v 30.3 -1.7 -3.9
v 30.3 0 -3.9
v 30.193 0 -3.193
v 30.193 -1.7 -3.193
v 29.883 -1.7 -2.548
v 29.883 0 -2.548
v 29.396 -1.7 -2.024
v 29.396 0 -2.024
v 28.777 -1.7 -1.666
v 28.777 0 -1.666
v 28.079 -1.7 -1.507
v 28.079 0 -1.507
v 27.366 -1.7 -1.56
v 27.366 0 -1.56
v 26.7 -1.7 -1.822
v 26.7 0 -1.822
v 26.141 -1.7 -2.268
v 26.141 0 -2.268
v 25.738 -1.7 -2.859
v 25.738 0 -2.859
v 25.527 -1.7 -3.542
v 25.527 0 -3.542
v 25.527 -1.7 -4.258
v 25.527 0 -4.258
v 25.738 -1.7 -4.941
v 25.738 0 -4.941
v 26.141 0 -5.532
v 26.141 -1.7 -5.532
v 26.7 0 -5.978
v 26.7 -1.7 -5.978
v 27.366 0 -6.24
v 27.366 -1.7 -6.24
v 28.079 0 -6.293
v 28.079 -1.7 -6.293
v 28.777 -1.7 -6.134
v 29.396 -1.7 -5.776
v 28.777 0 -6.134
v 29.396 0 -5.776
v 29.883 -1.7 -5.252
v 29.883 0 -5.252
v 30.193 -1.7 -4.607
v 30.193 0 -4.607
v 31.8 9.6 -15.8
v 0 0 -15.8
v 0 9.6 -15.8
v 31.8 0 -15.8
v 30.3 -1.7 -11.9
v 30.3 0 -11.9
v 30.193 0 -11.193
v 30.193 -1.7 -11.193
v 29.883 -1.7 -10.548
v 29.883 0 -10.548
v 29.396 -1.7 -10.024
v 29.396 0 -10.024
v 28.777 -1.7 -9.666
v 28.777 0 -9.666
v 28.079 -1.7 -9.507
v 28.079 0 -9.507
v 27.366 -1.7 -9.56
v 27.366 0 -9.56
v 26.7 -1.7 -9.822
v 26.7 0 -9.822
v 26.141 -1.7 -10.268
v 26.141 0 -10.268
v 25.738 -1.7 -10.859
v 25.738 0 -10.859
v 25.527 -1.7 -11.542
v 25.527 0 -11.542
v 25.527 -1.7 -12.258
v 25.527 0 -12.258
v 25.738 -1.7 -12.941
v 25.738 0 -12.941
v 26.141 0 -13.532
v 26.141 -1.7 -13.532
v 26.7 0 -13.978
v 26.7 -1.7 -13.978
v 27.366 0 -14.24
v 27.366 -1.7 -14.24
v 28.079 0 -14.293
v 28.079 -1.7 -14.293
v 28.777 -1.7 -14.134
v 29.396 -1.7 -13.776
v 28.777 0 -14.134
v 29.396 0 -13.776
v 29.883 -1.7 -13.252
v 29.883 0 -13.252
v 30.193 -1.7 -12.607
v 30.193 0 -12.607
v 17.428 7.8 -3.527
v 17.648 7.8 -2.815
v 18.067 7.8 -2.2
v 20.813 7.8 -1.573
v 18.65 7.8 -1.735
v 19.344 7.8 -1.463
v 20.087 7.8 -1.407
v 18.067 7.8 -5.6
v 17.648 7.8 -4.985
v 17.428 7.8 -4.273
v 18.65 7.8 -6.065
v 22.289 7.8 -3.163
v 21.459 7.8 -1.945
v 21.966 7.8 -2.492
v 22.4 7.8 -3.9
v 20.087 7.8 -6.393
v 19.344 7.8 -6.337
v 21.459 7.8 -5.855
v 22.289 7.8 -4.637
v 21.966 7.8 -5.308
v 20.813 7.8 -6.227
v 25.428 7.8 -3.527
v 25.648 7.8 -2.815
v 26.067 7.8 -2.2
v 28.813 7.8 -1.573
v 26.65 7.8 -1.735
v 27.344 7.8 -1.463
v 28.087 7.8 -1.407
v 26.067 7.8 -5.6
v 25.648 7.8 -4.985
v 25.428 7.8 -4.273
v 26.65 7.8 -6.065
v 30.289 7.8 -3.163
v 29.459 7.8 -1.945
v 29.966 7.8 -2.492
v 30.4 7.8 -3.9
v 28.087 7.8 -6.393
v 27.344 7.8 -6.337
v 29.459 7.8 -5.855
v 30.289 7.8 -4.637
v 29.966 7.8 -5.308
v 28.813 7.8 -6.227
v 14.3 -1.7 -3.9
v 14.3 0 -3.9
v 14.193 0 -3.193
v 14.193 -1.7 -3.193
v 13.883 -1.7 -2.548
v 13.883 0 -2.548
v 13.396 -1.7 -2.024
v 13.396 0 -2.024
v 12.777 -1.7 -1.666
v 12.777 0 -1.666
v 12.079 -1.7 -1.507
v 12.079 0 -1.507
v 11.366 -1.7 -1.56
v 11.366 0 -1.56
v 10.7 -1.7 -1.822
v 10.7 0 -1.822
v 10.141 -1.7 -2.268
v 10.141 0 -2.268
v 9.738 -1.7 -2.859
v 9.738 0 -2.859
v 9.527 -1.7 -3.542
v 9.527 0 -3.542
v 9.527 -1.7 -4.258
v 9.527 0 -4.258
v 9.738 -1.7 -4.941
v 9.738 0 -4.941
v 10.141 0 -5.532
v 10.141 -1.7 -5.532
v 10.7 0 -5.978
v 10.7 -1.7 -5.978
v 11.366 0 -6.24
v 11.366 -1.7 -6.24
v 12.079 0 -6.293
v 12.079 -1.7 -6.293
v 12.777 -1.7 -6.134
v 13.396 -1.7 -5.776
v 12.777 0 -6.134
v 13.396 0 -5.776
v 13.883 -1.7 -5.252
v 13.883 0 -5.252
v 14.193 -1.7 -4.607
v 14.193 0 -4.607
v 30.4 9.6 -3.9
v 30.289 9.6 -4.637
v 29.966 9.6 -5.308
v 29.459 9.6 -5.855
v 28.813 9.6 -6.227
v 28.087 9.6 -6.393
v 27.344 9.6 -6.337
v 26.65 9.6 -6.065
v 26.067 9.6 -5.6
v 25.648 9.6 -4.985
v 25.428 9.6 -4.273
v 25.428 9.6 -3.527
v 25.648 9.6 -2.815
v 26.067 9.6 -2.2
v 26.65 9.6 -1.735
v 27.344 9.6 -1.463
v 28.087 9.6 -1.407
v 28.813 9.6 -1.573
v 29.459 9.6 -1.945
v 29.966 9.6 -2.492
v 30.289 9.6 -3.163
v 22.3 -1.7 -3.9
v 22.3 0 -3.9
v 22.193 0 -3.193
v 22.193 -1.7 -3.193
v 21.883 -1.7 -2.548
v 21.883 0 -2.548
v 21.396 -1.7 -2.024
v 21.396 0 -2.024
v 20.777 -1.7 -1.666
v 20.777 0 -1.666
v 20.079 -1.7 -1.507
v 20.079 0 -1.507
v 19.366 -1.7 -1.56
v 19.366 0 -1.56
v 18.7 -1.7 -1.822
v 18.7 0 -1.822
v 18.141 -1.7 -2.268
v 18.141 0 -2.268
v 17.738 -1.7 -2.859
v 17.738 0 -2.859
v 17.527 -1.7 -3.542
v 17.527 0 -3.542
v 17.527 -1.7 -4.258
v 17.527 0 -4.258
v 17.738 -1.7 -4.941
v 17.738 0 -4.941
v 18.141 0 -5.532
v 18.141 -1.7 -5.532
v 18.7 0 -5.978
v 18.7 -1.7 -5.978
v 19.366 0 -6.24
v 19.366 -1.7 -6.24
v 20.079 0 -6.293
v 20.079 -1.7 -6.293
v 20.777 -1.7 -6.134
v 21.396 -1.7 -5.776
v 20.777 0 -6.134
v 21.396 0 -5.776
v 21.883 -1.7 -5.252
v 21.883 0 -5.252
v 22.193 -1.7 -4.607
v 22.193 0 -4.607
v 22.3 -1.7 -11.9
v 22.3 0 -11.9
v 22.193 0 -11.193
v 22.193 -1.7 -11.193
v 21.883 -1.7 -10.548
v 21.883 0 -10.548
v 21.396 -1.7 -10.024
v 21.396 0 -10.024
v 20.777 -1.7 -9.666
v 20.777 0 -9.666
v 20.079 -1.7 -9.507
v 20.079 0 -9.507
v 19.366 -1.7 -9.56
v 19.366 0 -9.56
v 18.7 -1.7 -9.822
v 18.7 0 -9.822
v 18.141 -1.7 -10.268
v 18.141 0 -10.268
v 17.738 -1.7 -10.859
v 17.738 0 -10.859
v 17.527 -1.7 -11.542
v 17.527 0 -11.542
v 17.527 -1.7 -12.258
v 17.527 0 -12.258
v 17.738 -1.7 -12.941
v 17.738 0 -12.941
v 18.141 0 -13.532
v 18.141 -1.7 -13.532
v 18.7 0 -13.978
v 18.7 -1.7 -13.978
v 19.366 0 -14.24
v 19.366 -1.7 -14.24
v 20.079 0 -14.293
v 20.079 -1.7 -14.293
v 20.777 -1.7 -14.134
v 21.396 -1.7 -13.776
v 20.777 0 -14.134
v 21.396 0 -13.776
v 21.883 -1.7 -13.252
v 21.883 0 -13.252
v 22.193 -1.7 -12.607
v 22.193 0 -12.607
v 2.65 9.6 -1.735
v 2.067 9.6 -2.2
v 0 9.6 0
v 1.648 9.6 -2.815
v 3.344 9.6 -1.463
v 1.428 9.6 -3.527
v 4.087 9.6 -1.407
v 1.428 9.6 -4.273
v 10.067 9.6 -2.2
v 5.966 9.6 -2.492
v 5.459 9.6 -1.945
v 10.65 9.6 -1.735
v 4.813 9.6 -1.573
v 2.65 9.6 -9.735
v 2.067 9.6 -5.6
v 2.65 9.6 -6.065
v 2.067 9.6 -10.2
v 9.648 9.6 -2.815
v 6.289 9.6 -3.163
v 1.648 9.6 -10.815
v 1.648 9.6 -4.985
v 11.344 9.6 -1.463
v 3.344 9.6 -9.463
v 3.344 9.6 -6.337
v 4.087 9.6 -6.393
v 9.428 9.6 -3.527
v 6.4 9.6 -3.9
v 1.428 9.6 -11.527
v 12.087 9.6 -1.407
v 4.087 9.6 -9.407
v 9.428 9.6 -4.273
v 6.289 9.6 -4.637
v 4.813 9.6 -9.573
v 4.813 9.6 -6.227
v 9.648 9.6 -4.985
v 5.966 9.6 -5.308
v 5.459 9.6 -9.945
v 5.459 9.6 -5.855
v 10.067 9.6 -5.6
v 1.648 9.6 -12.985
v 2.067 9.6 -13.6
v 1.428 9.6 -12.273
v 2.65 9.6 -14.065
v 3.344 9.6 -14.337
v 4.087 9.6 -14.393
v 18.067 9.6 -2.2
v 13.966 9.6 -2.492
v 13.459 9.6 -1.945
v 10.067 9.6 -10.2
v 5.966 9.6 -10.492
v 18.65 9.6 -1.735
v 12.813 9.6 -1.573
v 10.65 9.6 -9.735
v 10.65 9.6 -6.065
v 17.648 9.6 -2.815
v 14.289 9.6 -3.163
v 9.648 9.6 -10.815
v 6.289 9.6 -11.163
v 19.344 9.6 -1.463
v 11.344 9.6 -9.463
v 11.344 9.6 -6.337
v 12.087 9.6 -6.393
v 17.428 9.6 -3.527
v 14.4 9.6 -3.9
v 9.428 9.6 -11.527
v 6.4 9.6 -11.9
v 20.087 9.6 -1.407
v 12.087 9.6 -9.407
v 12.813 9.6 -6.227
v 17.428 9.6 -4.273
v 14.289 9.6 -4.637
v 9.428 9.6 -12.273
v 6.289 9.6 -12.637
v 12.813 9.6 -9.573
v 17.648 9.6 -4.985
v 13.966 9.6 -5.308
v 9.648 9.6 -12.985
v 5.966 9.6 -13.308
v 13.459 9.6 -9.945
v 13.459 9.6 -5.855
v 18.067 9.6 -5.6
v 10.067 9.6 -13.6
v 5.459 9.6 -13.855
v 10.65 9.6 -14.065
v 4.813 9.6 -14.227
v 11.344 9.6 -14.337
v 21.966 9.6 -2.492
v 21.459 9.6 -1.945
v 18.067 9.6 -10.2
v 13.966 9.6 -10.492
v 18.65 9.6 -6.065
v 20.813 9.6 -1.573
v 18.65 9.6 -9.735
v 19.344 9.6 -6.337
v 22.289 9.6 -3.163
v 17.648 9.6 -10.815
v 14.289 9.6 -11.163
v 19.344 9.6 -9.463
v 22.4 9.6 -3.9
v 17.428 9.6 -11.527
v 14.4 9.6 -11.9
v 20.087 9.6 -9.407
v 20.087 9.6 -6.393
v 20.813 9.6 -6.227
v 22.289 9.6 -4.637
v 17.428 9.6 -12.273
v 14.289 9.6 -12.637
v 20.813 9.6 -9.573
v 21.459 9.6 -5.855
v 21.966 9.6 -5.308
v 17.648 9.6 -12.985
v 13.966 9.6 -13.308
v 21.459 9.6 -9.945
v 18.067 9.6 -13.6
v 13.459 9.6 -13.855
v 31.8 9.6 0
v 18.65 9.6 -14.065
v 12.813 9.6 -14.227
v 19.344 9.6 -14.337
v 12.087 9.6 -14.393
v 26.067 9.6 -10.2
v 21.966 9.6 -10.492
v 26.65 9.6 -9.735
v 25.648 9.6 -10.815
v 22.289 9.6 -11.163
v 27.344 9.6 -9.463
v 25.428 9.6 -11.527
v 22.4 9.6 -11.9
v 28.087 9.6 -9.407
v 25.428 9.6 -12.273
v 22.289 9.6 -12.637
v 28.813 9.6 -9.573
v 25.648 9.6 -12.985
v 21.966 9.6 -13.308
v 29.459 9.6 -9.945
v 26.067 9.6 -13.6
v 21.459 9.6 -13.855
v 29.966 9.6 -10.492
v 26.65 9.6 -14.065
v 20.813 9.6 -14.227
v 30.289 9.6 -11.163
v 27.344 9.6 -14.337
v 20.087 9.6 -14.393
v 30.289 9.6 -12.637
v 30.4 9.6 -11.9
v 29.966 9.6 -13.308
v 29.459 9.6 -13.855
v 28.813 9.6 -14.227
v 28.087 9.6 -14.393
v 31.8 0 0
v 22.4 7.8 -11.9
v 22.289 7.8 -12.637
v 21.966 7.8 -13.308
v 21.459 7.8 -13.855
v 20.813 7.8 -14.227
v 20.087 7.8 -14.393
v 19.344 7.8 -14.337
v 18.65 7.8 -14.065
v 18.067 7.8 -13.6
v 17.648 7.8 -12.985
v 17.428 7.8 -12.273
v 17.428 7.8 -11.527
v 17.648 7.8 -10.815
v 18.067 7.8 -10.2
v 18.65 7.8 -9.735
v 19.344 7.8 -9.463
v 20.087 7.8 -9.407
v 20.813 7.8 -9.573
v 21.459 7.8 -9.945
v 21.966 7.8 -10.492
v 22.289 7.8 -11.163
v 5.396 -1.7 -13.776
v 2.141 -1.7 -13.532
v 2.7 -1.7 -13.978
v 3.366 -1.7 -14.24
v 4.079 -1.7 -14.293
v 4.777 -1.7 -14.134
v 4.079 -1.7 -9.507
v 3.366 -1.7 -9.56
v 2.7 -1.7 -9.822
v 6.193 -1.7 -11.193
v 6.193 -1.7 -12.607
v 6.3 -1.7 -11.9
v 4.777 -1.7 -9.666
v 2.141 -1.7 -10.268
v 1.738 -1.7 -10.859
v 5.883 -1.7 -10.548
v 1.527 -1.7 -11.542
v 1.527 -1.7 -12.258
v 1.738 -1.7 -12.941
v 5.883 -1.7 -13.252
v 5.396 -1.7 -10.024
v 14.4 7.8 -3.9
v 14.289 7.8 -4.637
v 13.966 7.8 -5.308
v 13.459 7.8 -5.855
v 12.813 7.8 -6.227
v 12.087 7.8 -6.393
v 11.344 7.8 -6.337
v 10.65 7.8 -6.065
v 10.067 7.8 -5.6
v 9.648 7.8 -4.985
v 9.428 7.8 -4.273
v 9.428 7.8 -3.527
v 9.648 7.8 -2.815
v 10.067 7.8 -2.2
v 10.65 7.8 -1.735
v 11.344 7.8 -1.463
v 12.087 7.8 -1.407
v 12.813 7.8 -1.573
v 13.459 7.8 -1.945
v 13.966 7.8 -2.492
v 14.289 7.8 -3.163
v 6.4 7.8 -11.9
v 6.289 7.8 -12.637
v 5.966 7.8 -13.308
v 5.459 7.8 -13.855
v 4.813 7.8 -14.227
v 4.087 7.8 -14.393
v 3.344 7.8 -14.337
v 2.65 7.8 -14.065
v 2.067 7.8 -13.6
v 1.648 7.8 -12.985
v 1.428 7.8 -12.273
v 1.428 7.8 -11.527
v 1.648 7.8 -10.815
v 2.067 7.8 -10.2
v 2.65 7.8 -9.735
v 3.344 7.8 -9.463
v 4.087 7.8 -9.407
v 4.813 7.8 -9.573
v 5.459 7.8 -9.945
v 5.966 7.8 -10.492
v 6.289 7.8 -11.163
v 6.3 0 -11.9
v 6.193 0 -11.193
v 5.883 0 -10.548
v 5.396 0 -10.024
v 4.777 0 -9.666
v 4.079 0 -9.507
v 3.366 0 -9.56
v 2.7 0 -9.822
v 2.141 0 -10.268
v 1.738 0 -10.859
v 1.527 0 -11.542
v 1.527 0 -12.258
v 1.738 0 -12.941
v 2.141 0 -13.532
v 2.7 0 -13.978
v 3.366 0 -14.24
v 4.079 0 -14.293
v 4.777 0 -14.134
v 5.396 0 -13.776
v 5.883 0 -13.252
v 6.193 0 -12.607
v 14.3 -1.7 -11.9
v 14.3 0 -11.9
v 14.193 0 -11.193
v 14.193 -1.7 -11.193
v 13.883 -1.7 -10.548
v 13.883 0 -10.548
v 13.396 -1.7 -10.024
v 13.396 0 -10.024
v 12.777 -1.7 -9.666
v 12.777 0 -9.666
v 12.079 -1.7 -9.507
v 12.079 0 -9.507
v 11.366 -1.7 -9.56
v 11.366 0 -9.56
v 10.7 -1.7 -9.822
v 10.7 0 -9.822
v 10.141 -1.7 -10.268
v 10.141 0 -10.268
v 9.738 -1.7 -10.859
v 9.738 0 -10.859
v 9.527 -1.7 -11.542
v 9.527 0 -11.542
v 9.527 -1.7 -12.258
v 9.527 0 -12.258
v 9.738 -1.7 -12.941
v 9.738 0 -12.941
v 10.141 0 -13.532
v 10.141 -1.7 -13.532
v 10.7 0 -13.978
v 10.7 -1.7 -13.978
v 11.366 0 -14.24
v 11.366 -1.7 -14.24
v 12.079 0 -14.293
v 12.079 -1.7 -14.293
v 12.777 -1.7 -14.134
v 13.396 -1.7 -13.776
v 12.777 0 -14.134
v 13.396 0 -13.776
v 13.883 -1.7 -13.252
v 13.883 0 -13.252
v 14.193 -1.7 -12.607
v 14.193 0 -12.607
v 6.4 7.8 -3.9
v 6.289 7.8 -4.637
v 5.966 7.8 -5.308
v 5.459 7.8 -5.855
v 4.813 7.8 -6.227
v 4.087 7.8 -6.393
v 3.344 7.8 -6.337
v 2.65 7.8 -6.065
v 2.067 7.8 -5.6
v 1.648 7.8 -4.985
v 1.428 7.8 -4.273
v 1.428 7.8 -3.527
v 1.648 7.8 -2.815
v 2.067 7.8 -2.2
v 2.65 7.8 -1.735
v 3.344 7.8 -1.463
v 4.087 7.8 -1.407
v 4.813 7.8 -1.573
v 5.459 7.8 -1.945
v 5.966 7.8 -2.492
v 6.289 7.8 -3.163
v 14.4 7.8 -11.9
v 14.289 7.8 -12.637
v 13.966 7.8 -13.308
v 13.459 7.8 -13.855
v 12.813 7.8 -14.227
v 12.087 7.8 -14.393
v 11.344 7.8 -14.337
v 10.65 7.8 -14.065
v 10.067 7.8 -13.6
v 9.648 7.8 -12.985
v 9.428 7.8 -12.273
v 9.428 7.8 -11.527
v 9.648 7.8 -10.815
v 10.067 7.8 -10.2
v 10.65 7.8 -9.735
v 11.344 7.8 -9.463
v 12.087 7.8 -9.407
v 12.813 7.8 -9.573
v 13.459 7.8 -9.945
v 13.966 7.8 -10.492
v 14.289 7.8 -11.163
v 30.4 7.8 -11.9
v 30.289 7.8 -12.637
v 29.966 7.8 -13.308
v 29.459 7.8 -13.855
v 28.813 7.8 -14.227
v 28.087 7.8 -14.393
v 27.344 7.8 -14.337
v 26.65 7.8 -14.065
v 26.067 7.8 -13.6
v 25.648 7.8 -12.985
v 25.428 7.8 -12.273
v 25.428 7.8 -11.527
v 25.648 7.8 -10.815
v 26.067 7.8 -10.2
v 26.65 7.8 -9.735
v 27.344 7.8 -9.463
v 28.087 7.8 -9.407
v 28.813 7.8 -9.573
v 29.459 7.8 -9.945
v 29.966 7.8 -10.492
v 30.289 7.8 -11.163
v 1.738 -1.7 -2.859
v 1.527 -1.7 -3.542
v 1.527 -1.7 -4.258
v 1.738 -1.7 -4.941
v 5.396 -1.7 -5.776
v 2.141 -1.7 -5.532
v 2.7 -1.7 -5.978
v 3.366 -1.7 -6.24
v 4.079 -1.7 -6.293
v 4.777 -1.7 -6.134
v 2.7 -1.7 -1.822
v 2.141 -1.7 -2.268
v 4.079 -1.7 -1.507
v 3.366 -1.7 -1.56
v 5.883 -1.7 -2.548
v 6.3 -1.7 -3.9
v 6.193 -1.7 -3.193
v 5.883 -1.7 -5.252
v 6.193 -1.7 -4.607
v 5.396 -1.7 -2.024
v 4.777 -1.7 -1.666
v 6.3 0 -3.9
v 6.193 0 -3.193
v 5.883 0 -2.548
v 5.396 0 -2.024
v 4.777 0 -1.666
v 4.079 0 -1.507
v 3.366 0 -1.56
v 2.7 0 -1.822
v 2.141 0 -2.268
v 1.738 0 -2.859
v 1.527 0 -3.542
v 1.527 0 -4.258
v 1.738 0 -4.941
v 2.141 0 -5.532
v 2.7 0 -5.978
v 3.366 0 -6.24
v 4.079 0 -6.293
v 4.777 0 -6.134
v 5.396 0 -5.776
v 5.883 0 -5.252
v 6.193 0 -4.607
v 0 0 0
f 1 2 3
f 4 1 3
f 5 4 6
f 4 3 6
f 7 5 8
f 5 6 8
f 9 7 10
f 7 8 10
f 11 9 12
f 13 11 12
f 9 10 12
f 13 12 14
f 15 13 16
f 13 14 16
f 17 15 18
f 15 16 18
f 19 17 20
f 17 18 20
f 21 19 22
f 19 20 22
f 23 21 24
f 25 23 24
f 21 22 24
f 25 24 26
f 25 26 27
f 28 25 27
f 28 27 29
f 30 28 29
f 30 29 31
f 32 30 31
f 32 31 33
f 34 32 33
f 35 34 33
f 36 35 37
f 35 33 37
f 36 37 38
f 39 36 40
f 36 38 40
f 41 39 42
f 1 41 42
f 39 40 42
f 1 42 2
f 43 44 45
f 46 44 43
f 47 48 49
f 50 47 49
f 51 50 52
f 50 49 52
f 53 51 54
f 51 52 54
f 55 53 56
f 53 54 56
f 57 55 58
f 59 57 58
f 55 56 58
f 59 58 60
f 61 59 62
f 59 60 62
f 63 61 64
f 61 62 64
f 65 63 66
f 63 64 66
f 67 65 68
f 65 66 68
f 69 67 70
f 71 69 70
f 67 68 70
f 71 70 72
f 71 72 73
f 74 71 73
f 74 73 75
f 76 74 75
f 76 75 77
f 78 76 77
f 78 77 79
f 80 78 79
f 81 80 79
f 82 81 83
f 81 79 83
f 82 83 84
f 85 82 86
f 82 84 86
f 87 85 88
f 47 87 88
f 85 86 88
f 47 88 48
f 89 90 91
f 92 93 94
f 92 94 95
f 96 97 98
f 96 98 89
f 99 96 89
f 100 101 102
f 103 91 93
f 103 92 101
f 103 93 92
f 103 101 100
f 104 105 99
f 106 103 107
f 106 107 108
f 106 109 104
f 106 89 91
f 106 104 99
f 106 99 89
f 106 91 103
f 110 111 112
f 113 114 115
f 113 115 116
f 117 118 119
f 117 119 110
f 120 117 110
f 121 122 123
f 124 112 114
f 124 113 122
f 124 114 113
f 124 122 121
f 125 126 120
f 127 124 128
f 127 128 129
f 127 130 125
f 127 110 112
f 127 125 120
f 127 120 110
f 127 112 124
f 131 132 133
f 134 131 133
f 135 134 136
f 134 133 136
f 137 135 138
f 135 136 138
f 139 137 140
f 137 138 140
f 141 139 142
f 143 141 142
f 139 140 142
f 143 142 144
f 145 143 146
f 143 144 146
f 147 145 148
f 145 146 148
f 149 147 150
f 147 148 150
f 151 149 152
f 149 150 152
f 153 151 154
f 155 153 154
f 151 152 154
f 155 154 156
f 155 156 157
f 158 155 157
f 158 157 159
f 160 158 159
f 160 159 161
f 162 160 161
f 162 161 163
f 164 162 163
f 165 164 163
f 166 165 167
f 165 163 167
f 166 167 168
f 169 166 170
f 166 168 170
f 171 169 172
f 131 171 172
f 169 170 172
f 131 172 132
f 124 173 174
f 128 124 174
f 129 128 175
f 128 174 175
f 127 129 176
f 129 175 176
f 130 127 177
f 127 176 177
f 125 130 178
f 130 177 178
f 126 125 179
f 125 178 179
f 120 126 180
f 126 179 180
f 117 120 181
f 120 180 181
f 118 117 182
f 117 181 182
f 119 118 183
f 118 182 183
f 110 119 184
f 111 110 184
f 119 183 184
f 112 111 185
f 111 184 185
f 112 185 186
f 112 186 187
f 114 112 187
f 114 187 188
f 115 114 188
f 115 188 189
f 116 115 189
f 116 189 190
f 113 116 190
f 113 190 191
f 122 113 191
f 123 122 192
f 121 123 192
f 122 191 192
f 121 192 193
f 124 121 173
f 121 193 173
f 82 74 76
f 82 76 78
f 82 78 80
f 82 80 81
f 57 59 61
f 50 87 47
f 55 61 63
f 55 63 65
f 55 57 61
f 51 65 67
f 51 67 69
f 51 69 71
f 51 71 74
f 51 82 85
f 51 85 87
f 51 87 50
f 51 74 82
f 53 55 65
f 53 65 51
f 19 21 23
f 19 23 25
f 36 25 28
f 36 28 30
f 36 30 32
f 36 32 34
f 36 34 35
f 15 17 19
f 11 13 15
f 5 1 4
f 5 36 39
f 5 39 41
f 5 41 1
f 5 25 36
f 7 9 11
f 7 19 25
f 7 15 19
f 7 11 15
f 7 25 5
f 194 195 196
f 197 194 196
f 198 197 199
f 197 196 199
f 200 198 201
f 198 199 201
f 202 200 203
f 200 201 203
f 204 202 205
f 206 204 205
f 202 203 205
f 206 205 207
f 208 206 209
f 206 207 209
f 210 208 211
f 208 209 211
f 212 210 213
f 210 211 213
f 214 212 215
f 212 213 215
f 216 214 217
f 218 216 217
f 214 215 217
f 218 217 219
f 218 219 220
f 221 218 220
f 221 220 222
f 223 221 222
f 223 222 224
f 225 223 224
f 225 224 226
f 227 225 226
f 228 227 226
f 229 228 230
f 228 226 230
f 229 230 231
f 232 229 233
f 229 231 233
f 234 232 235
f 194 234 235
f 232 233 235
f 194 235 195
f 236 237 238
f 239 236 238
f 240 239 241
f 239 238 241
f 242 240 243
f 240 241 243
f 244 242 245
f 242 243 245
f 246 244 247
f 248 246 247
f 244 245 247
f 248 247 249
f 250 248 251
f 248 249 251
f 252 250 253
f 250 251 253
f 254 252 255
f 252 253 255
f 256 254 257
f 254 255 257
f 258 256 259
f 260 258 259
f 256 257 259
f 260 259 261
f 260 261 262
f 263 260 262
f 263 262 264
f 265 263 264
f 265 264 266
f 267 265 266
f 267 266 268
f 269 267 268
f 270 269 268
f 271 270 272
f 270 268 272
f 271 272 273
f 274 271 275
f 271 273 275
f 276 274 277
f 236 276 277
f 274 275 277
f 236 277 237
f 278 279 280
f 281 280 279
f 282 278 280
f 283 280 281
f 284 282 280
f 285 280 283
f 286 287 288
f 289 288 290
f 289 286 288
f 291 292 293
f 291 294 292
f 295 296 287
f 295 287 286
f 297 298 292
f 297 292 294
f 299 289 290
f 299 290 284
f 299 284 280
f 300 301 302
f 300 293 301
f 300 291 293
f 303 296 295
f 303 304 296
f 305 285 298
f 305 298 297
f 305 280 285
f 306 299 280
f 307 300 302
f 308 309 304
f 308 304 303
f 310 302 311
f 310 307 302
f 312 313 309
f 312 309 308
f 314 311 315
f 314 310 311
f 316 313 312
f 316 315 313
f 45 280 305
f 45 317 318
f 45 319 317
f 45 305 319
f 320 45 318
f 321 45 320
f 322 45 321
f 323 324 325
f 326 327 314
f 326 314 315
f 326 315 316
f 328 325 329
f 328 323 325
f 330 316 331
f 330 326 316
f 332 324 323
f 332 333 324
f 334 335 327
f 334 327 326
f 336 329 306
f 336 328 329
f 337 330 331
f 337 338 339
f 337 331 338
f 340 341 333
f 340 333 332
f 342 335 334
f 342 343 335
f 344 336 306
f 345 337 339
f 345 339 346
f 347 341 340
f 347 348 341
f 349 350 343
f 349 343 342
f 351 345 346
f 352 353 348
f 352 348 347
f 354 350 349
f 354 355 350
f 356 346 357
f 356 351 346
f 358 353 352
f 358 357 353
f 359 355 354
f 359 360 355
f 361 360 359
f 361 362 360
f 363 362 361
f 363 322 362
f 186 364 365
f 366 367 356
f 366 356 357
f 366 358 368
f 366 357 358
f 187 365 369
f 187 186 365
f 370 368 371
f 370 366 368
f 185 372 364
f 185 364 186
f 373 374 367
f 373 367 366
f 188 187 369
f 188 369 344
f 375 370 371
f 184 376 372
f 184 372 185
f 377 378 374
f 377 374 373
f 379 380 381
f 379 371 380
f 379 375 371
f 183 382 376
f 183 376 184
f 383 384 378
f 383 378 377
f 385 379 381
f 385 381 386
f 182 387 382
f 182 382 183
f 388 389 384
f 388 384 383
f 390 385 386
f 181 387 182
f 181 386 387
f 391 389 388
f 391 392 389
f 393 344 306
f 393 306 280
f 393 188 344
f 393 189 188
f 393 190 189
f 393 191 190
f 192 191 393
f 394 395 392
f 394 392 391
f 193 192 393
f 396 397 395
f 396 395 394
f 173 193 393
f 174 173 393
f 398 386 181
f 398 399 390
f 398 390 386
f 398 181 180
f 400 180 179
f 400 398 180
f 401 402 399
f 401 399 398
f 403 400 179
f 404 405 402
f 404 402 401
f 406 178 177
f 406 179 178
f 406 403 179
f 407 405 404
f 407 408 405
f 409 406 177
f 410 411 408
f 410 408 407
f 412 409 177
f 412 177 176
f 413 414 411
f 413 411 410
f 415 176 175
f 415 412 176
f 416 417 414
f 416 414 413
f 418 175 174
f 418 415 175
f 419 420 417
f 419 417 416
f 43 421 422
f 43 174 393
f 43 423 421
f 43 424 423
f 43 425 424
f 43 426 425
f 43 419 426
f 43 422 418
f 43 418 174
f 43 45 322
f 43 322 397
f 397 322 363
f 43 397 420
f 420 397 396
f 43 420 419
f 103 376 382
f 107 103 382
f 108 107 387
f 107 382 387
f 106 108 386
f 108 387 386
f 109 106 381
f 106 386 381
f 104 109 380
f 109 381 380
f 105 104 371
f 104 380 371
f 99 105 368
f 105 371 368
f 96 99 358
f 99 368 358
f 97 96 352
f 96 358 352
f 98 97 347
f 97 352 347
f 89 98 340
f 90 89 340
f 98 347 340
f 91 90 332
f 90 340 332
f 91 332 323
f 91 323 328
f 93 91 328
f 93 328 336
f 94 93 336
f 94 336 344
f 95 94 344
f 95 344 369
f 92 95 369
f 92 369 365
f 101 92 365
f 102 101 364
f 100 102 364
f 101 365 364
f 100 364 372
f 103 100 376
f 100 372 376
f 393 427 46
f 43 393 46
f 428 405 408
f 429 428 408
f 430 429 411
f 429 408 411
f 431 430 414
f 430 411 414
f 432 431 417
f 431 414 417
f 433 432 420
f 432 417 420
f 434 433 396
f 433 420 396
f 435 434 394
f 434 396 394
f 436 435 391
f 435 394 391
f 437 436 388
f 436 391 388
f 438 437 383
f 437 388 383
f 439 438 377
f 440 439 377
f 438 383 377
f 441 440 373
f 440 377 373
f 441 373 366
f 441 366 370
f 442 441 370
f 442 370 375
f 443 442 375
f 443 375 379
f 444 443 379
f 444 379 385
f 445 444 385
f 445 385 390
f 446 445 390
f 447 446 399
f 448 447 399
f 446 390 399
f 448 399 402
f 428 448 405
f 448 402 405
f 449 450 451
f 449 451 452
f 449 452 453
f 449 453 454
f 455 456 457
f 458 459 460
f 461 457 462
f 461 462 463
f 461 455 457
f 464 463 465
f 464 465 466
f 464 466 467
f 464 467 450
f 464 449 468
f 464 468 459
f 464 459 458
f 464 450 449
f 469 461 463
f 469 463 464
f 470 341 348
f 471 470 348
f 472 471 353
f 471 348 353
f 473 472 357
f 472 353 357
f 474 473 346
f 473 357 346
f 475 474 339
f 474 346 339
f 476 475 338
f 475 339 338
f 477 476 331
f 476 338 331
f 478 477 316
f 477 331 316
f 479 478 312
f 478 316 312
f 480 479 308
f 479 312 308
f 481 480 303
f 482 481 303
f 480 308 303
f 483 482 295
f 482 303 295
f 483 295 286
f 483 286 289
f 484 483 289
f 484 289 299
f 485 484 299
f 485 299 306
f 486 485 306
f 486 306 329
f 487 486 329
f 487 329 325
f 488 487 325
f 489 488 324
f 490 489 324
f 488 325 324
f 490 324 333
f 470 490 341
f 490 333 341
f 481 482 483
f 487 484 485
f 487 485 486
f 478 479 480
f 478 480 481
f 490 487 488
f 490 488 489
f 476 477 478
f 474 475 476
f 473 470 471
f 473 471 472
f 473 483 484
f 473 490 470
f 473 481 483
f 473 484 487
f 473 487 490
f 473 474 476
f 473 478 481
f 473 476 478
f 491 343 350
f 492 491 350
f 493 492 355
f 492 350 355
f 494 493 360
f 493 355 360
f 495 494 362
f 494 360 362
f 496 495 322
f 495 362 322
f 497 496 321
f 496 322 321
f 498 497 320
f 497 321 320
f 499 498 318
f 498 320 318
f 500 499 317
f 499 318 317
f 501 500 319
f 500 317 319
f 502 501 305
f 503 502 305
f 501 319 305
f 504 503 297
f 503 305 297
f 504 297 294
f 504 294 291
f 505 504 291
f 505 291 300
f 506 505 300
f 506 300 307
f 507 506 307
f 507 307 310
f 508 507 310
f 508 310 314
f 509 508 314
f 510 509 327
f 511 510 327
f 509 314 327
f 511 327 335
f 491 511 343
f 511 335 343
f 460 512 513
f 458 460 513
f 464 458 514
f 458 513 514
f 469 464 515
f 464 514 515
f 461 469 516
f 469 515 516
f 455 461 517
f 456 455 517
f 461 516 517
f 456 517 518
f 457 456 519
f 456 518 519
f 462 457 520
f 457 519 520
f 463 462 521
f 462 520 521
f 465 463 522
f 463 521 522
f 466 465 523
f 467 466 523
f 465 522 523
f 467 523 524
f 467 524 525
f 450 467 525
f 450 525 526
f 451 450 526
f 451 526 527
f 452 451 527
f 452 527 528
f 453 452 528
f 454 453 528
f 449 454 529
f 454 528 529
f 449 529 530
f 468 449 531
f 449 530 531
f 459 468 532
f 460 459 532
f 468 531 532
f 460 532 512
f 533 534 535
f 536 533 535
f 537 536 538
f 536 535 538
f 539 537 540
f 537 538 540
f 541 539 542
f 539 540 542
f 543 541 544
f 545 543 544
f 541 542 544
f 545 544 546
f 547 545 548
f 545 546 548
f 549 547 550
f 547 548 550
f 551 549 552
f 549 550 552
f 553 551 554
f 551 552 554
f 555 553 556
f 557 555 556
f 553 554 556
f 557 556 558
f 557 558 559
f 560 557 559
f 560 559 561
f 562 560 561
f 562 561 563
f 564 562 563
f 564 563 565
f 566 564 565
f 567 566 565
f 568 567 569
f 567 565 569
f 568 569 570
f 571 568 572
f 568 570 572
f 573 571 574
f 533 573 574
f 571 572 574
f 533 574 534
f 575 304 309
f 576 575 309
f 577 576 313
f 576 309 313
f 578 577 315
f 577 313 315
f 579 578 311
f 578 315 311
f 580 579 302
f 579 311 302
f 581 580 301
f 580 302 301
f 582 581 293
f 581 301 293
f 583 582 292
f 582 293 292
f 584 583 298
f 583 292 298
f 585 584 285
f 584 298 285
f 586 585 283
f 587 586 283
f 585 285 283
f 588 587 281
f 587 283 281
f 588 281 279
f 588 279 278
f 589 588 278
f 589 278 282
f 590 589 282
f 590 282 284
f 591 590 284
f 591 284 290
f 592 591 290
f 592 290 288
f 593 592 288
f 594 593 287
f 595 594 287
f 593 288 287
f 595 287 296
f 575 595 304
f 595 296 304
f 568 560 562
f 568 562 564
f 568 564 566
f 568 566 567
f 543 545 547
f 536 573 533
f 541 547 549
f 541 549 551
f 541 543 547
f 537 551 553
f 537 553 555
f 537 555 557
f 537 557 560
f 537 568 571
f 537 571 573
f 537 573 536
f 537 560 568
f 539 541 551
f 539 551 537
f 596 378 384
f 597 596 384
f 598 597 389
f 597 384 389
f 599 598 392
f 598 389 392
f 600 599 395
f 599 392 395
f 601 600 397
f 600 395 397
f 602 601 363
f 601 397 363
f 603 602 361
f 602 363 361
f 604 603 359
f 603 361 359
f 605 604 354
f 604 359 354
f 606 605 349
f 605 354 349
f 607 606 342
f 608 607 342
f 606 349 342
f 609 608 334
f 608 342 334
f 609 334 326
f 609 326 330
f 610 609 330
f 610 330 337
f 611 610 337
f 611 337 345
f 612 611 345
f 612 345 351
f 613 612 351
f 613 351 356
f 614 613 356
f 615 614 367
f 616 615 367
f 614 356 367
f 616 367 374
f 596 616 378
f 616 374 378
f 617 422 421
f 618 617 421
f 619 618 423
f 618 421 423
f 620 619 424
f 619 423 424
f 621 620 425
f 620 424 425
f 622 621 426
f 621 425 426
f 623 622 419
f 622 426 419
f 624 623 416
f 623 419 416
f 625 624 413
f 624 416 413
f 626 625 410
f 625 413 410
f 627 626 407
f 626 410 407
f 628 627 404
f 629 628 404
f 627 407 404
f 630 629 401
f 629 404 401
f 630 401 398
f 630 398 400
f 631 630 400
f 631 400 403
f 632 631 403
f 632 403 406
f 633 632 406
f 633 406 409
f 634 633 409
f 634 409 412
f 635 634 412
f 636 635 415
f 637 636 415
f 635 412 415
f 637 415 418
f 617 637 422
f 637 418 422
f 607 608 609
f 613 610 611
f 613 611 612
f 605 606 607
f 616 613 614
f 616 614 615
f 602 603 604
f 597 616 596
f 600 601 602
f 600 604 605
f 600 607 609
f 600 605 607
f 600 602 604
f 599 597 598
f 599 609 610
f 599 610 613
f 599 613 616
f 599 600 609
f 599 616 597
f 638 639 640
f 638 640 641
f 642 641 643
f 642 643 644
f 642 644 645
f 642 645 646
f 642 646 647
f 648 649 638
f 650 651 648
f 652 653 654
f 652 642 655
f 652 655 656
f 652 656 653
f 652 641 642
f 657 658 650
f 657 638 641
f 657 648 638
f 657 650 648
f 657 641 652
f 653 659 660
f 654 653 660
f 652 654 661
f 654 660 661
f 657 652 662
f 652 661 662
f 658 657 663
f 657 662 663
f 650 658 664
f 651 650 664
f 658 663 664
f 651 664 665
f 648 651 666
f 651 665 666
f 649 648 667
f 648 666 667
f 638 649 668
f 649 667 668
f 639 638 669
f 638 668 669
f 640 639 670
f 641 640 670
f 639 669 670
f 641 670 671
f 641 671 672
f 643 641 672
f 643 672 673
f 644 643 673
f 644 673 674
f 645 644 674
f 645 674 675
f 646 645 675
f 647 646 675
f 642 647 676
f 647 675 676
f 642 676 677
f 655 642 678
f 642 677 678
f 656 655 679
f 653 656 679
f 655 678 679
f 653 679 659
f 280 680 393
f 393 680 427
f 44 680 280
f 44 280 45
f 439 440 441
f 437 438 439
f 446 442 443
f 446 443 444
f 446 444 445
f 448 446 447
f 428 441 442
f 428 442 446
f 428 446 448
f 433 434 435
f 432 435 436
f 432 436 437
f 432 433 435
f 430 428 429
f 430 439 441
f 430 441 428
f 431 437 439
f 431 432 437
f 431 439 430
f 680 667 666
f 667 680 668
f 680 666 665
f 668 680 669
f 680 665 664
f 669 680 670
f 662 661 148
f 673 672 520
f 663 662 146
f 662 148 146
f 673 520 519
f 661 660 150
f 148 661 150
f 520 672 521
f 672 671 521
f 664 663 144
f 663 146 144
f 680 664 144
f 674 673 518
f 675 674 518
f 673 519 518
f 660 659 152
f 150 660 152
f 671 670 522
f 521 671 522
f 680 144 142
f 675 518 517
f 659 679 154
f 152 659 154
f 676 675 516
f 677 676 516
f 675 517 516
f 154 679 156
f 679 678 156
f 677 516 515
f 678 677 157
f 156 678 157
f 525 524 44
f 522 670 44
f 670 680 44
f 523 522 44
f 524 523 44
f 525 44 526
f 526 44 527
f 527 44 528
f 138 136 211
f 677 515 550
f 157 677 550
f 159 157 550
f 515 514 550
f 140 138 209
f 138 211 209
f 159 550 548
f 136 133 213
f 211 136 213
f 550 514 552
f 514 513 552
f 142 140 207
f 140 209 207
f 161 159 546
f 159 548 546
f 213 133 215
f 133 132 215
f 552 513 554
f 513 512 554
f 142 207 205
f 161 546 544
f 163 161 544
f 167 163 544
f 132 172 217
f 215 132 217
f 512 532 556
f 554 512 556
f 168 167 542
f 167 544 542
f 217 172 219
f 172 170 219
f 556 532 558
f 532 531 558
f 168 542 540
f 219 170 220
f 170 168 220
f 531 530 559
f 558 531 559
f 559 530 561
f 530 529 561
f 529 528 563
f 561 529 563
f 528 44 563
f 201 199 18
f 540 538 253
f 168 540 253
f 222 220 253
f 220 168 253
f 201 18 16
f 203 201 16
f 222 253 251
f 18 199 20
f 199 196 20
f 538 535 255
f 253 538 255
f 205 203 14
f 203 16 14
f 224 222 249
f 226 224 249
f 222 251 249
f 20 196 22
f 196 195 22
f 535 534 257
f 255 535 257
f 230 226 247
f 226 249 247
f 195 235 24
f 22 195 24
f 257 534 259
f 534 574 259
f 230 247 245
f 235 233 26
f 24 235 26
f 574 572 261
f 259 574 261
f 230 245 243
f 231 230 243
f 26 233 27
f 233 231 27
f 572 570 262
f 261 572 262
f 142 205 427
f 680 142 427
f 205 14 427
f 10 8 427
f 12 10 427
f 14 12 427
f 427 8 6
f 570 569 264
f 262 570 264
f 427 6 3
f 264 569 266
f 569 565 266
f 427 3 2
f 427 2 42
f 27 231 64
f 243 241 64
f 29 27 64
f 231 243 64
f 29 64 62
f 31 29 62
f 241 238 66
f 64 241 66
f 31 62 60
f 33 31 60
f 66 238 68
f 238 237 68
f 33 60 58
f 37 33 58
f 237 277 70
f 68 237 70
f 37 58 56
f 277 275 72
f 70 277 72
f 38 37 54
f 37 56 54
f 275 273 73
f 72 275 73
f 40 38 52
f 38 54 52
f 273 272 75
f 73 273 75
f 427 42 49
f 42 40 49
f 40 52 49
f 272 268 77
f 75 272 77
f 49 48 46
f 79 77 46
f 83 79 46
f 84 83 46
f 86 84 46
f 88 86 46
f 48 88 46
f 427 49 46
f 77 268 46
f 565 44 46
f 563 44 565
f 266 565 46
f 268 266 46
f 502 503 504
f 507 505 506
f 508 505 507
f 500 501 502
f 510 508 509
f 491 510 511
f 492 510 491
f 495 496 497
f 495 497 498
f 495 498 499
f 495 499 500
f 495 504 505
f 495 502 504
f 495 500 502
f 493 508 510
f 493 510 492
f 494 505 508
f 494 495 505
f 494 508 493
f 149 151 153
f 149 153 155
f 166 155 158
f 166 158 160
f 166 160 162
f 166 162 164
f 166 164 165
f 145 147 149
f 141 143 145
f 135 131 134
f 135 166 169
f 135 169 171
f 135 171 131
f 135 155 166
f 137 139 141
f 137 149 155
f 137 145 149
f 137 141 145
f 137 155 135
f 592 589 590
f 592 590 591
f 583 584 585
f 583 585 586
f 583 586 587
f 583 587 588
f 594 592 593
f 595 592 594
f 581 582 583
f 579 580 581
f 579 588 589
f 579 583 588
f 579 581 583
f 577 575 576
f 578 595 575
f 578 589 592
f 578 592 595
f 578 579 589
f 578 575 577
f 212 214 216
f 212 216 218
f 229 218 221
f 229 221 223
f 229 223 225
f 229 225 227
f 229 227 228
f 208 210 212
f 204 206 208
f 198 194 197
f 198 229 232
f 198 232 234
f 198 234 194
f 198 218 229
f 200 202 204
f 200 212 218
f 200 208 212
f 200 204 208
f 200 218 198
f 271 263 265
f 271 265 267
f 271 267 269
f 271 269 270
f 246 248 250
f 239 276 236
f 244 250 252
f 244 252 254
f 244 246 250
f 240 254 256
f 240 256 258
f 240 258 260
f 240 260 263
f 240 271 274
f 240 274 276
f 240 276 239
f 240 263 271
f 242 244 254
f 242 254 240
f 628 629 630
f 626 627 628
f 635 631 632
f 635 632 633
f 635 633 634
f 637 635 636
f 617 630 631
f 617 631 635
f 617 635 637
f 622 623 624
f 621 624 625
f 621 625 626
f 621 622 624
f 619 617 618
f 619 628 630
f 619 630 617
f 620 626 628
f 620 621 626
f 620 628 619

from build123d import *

# Parameters (mm, degrees)
SKETCH_1_W          = 31.8
SKETCH_1_H          = 15.8
EXTRUDE_1_DEPTH     = 9.6
SKETCH_2_R          = 2.4
EXTRUDE_4_DEPTH     = 1.7
SKETCH_3_R          = 2.5
CUT_EXTRUDE_1_DEPTH = 1.8


with BuildPart() as part:
    # Эскиз1 → Бобышка-Вытянуть1 (new body)
    with BuildSketch(Plane(origin=(0, 0, 0), x_dir=(1, 0, 0), z_dir=(0, 1, 0))):
        with Locations((15.9, 7.9)):
            Rectangle(SKETCH_1_W, SKETCH_1_H)
    extrude(amount=EXTRUDE_1_DEPTH)

    # Эскиз2 → Бобышка-Вытянуть4 (add)
    with BuildSketch(Plane.XZ):
        with Locations((27.9, -3.9)):
            Circle(SKETCH_2_R)
        with Locations((19.9, -3.9)):
            Circle(SKETCH_2_R)
        with Locations((11.9, -3.9)):
            Circle(SKETCH_2_R)
        with Locations((3.9, -3.9)):
            Circle(SKETCH_2_R)
        with Locations((19.9, -11.9)):
            Circle(SKETCH_2_R)
        with Locations((11.9, -11.9)):
            Circle(SKETCH_2_R)
        with Locations((3.9, -11.9)):
            Circle(SKETCH_2_R)
        with Locations((27.9, -11.9)):
            Circle(SKETCH_2_R)
    extrude(amount=EXTRUDE_4_DEPTH)

    # Эскиз3 → Вырез-Вытянуть1 (cut)
    with BuildSketch(Plane(origin=(0, 9.6, 0), x_dir=(1, 0, 0), z_dir=(0, 1, 0))):
        with Locations((27.9, 3.9)):
            Circle(SKETCH_3_R)
        with Locations((19.9, 3.9)):
            Circle(SKETCH_3_R)
        with Locations((11.9, 3.9)):
            Circle(SKETCH_3_R)
        with Locations((3.9, 3.9)):
            Circle(SKETCH_3_R)
        with Locations((19.9, 11.9)):
            Circle(SKETCH_3_R)
        with Locations((11.9, 11.9)):
            Circle(SKETCH_3_R)
        with Locations((3.9, 11.9)):
            Circle(SKETCH_3_R)
        with Locations((27.9, 11.9)):
            Circle(SKETCH_3_R)
    extrude(amount=-CUT_EXTRUDE_1_DEPTH, mode=Mode.SUBTRACT)


solid = part.part
